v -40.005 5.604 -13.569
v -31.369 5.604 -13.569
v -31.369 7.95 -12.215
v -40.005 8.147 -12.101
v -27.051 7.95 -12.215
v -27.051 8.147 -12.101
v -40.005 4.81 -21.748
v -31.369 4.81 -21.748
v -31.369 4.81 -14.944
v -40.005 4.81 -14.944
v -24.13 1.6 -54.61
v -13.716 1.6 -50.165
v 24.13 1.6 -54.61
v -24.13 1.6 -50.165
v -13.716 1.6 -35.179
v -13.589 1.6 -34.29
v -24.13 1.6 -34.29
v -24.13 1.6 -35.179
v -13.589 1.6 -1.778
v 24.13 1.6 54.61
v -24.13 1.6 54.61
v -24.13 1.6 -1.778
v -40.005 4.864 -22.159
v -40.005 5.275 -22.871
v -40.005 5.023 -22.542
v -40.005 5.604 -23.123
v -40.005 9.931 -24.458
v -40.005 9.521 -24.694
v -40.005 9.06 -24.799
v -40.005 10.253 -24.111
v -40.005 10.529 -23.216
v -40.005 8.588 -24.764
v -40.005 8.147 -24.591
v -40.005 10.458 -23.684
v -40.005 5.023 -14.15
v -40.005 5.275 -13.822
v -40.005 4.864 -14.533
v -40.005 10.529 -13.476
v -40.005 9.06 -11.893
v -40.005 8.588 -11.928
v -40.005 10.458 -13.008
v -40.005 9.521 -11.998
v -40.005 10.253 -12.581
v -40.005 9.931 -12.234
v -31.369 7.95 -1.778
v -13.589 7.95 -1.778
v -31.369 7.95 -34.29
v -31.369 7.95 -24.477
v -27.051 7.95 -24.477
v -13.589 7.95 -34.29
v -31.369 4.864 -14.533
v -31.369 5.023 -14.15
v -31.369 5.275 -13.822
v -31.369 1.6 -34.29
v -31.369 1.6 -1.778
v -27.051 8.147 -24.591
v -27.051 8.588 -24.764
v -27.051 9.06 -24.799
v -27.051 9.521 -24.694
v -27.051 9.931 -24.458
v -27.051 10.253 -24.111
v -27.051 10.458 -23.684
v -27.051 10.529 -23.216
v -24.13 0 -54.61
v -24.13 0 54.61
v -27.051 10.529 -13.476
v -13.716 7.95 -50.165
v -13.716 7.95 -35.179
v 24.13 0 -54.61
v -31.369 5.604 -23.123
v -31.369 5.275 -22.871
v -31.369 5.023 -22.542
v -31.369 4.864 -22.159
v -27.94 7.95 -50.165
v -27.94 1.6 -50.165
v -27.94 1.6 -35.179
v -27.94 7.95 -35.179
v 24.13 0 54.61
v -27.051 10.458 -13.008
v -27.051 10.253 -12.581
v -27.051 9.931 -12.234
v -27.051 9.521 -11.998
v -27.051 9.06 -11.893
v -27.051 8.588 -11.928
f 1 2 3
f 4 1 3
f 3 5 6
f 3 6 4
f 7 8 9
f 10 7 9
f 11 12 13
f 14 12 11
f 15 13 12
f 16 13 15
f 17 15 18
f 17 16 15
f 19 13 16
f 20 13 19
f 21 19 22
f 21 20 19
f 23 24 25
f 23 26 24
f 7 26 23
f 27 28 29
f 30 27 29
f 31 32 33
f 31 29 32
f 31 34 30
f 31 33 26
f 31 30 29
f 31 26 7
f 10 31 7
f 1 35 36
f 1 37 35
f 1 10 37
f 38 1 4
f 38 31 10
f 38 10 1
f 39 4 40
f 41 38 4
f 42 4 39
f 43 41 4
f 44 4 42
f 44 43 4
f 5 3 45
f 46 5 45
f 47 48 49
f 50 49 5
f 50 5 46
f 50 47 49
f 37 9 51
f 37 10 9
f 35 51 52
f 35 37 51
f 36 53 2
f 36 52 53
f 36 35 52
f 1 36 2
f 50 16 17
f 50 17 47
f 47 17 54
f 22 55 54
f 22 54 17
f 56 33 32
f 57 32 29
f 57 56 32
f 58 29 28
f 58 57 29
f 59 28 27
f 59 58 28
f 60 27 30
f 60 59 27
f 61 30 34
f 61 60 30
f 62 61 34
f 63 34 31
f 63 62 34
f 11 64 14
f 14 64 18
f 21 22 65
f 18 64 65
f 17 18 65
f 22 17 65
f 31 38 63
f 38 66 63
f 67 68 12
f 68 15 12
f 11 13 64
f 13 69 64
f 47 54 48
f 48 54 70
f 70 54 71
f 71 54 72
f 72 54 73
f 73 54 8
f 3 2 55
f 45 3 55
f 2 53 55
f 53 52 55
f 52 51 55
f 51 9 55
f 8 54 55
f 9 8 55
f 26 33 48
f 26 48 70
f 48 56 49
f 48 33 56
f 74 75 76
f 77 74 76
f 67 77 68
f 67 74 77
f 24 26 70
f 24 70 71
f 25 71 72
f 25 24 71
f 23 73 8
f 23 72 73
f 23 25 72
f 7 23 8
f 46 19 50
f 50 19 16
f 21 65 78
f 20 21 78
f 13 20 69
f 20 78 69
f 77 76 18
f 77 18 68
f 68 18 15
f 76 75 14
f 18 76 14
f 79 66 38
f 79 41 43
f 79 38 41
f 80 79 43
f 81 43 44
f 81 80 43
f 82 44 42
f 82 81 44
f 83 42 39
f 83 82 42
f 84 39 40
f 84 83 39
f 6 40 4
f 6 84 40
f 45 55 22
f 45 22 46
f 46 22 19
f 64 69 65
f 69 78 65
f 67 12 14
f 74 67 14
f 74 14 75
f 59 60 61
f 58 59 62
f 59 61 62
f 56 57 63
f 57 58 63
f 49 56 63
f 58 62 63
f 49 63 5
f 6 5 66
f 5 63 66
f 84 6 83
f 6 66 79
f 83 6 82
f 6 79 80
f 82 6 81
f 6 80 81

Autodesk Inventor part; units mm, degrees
ref_plane "YZ Plane" through (0, 0, 0) normal (1, 0, 0) x (0, 1, 0)
ref_plane "XZ Plane" through (0, 0, 0) normal (0, 1, 0) x (-1, 0, 0)
ref_plane "XY Plane" through (0, 0, 0) normal (0, 0, 1) x (1, 0, 0)
sketch "Sketch1" plane through (0, 0, 0) normal (0, 1, 0) x (-1, 0, 0)
  line L0 (24.13, 54.61) -> (-24.13, 54.61)
  line L1 (-24.13, 54.61) -> (-24.13, -54.61)
  line L2 (-24.13, -54.61) -> (24.13, -54.61)
  line L3 (24.13, -54.61) -> (24.13, 54.61)
  point P0 (0, 0)
  dimension "d0" = 109.22
  dimension "d1" = 48.26
  dimension "d4" = 24.13
  dimension "d5" = 54.61
extrude "Extrusion1" add sketch "Sketch1" along normal blind 1.6
sketch "Sketch2" plane through (0, 1.6, 0) normal (0, 1, 0) x (1, 0, 0)
  line L0 (-13.716, 50.165) -> (-27.94, 50.165)
  line L1 (-27.94, 50.165) -> (-27.94, 35.179)
  line L2 (-27.94, 35.179) -> (-13.716, 35.179)
  line L3 (-13.716, 35.179) -> (-13.716, 50.165)
  line L4 (-24.13, 54.61) -> (-24.13, -54.61) projected
  line L5 (24.13, 54.61) -> (-24.13, 54.61) projected
  point P0 (0, 0)
  dimension "d6" = 14.224
  dimension "d7" = 14.986
  dimension "d8" = 3.81
  dimension "d9" = 4.445
extrude "Extrusion2" add sketch "Sketch2" along normal blind 6.35
sketch "Sketch3" plane through (0, 1.6, 0) normal (0, 1, 0) x (1, 0, 0)
  line L0 (-31.369, 1.778) -> (-13.589, 1.778)
  line L1 (-13.589, 1.778) -> (-13.589, 34.29)
  line L2 (-13.589, 34.29) -> (-31.369, 34.29)
  line L3 (-31.369, 34.29) -> (-31.369, 1.778)
  line L4 (24.13, 54.61) -> (-24.13, 54.61) projected
  line L5 (-24.13, 35.179) -> (-24.13, -54.61) projected
  point P0 (0, 0)
  dimension "d12" = 32.512
  dimension "d13" = 17.78
  dimension "d14" = 20.32
  dimension "d15" = 7.239
extrude "Extrusion3" add sketch "Sketch3" along normal blind 6.35
sketch "Sketch4" plane through (-31.369, 1.6, -34.29) normal (-1, 0, 0) x (0, 0, 1)
  line L0 (11.6254, 3.2104) -> (20.2625, 3.2104)
  line L1 (20.2625, 3.2104) -> (23.564, 8.9287)
  line L2 (23.564, 8.9287) -> (8.324, 8.9287)
  line L3 (8.324, 8.9287) -> (11.6254, 3.2104)
  point P0 (34.29, -1.6)
  dimension "d18" = 120
  dimension "d19" = 120
  dimension "d20" = 15.24
extrude "Extrusion4" add sketch "Sketch4" along normal blind 8.636 and the other way blind 4.318
fillet "Fillet1" radius 1.5875 4 edges at (-33.528, 10.5287, -25.966) (-33.528, 10.5287, -10.726) (-35.687, 4.8104, -22.6646) (-35.687, 4.8104, -14.0275)
properties part number "ControlBoard"
